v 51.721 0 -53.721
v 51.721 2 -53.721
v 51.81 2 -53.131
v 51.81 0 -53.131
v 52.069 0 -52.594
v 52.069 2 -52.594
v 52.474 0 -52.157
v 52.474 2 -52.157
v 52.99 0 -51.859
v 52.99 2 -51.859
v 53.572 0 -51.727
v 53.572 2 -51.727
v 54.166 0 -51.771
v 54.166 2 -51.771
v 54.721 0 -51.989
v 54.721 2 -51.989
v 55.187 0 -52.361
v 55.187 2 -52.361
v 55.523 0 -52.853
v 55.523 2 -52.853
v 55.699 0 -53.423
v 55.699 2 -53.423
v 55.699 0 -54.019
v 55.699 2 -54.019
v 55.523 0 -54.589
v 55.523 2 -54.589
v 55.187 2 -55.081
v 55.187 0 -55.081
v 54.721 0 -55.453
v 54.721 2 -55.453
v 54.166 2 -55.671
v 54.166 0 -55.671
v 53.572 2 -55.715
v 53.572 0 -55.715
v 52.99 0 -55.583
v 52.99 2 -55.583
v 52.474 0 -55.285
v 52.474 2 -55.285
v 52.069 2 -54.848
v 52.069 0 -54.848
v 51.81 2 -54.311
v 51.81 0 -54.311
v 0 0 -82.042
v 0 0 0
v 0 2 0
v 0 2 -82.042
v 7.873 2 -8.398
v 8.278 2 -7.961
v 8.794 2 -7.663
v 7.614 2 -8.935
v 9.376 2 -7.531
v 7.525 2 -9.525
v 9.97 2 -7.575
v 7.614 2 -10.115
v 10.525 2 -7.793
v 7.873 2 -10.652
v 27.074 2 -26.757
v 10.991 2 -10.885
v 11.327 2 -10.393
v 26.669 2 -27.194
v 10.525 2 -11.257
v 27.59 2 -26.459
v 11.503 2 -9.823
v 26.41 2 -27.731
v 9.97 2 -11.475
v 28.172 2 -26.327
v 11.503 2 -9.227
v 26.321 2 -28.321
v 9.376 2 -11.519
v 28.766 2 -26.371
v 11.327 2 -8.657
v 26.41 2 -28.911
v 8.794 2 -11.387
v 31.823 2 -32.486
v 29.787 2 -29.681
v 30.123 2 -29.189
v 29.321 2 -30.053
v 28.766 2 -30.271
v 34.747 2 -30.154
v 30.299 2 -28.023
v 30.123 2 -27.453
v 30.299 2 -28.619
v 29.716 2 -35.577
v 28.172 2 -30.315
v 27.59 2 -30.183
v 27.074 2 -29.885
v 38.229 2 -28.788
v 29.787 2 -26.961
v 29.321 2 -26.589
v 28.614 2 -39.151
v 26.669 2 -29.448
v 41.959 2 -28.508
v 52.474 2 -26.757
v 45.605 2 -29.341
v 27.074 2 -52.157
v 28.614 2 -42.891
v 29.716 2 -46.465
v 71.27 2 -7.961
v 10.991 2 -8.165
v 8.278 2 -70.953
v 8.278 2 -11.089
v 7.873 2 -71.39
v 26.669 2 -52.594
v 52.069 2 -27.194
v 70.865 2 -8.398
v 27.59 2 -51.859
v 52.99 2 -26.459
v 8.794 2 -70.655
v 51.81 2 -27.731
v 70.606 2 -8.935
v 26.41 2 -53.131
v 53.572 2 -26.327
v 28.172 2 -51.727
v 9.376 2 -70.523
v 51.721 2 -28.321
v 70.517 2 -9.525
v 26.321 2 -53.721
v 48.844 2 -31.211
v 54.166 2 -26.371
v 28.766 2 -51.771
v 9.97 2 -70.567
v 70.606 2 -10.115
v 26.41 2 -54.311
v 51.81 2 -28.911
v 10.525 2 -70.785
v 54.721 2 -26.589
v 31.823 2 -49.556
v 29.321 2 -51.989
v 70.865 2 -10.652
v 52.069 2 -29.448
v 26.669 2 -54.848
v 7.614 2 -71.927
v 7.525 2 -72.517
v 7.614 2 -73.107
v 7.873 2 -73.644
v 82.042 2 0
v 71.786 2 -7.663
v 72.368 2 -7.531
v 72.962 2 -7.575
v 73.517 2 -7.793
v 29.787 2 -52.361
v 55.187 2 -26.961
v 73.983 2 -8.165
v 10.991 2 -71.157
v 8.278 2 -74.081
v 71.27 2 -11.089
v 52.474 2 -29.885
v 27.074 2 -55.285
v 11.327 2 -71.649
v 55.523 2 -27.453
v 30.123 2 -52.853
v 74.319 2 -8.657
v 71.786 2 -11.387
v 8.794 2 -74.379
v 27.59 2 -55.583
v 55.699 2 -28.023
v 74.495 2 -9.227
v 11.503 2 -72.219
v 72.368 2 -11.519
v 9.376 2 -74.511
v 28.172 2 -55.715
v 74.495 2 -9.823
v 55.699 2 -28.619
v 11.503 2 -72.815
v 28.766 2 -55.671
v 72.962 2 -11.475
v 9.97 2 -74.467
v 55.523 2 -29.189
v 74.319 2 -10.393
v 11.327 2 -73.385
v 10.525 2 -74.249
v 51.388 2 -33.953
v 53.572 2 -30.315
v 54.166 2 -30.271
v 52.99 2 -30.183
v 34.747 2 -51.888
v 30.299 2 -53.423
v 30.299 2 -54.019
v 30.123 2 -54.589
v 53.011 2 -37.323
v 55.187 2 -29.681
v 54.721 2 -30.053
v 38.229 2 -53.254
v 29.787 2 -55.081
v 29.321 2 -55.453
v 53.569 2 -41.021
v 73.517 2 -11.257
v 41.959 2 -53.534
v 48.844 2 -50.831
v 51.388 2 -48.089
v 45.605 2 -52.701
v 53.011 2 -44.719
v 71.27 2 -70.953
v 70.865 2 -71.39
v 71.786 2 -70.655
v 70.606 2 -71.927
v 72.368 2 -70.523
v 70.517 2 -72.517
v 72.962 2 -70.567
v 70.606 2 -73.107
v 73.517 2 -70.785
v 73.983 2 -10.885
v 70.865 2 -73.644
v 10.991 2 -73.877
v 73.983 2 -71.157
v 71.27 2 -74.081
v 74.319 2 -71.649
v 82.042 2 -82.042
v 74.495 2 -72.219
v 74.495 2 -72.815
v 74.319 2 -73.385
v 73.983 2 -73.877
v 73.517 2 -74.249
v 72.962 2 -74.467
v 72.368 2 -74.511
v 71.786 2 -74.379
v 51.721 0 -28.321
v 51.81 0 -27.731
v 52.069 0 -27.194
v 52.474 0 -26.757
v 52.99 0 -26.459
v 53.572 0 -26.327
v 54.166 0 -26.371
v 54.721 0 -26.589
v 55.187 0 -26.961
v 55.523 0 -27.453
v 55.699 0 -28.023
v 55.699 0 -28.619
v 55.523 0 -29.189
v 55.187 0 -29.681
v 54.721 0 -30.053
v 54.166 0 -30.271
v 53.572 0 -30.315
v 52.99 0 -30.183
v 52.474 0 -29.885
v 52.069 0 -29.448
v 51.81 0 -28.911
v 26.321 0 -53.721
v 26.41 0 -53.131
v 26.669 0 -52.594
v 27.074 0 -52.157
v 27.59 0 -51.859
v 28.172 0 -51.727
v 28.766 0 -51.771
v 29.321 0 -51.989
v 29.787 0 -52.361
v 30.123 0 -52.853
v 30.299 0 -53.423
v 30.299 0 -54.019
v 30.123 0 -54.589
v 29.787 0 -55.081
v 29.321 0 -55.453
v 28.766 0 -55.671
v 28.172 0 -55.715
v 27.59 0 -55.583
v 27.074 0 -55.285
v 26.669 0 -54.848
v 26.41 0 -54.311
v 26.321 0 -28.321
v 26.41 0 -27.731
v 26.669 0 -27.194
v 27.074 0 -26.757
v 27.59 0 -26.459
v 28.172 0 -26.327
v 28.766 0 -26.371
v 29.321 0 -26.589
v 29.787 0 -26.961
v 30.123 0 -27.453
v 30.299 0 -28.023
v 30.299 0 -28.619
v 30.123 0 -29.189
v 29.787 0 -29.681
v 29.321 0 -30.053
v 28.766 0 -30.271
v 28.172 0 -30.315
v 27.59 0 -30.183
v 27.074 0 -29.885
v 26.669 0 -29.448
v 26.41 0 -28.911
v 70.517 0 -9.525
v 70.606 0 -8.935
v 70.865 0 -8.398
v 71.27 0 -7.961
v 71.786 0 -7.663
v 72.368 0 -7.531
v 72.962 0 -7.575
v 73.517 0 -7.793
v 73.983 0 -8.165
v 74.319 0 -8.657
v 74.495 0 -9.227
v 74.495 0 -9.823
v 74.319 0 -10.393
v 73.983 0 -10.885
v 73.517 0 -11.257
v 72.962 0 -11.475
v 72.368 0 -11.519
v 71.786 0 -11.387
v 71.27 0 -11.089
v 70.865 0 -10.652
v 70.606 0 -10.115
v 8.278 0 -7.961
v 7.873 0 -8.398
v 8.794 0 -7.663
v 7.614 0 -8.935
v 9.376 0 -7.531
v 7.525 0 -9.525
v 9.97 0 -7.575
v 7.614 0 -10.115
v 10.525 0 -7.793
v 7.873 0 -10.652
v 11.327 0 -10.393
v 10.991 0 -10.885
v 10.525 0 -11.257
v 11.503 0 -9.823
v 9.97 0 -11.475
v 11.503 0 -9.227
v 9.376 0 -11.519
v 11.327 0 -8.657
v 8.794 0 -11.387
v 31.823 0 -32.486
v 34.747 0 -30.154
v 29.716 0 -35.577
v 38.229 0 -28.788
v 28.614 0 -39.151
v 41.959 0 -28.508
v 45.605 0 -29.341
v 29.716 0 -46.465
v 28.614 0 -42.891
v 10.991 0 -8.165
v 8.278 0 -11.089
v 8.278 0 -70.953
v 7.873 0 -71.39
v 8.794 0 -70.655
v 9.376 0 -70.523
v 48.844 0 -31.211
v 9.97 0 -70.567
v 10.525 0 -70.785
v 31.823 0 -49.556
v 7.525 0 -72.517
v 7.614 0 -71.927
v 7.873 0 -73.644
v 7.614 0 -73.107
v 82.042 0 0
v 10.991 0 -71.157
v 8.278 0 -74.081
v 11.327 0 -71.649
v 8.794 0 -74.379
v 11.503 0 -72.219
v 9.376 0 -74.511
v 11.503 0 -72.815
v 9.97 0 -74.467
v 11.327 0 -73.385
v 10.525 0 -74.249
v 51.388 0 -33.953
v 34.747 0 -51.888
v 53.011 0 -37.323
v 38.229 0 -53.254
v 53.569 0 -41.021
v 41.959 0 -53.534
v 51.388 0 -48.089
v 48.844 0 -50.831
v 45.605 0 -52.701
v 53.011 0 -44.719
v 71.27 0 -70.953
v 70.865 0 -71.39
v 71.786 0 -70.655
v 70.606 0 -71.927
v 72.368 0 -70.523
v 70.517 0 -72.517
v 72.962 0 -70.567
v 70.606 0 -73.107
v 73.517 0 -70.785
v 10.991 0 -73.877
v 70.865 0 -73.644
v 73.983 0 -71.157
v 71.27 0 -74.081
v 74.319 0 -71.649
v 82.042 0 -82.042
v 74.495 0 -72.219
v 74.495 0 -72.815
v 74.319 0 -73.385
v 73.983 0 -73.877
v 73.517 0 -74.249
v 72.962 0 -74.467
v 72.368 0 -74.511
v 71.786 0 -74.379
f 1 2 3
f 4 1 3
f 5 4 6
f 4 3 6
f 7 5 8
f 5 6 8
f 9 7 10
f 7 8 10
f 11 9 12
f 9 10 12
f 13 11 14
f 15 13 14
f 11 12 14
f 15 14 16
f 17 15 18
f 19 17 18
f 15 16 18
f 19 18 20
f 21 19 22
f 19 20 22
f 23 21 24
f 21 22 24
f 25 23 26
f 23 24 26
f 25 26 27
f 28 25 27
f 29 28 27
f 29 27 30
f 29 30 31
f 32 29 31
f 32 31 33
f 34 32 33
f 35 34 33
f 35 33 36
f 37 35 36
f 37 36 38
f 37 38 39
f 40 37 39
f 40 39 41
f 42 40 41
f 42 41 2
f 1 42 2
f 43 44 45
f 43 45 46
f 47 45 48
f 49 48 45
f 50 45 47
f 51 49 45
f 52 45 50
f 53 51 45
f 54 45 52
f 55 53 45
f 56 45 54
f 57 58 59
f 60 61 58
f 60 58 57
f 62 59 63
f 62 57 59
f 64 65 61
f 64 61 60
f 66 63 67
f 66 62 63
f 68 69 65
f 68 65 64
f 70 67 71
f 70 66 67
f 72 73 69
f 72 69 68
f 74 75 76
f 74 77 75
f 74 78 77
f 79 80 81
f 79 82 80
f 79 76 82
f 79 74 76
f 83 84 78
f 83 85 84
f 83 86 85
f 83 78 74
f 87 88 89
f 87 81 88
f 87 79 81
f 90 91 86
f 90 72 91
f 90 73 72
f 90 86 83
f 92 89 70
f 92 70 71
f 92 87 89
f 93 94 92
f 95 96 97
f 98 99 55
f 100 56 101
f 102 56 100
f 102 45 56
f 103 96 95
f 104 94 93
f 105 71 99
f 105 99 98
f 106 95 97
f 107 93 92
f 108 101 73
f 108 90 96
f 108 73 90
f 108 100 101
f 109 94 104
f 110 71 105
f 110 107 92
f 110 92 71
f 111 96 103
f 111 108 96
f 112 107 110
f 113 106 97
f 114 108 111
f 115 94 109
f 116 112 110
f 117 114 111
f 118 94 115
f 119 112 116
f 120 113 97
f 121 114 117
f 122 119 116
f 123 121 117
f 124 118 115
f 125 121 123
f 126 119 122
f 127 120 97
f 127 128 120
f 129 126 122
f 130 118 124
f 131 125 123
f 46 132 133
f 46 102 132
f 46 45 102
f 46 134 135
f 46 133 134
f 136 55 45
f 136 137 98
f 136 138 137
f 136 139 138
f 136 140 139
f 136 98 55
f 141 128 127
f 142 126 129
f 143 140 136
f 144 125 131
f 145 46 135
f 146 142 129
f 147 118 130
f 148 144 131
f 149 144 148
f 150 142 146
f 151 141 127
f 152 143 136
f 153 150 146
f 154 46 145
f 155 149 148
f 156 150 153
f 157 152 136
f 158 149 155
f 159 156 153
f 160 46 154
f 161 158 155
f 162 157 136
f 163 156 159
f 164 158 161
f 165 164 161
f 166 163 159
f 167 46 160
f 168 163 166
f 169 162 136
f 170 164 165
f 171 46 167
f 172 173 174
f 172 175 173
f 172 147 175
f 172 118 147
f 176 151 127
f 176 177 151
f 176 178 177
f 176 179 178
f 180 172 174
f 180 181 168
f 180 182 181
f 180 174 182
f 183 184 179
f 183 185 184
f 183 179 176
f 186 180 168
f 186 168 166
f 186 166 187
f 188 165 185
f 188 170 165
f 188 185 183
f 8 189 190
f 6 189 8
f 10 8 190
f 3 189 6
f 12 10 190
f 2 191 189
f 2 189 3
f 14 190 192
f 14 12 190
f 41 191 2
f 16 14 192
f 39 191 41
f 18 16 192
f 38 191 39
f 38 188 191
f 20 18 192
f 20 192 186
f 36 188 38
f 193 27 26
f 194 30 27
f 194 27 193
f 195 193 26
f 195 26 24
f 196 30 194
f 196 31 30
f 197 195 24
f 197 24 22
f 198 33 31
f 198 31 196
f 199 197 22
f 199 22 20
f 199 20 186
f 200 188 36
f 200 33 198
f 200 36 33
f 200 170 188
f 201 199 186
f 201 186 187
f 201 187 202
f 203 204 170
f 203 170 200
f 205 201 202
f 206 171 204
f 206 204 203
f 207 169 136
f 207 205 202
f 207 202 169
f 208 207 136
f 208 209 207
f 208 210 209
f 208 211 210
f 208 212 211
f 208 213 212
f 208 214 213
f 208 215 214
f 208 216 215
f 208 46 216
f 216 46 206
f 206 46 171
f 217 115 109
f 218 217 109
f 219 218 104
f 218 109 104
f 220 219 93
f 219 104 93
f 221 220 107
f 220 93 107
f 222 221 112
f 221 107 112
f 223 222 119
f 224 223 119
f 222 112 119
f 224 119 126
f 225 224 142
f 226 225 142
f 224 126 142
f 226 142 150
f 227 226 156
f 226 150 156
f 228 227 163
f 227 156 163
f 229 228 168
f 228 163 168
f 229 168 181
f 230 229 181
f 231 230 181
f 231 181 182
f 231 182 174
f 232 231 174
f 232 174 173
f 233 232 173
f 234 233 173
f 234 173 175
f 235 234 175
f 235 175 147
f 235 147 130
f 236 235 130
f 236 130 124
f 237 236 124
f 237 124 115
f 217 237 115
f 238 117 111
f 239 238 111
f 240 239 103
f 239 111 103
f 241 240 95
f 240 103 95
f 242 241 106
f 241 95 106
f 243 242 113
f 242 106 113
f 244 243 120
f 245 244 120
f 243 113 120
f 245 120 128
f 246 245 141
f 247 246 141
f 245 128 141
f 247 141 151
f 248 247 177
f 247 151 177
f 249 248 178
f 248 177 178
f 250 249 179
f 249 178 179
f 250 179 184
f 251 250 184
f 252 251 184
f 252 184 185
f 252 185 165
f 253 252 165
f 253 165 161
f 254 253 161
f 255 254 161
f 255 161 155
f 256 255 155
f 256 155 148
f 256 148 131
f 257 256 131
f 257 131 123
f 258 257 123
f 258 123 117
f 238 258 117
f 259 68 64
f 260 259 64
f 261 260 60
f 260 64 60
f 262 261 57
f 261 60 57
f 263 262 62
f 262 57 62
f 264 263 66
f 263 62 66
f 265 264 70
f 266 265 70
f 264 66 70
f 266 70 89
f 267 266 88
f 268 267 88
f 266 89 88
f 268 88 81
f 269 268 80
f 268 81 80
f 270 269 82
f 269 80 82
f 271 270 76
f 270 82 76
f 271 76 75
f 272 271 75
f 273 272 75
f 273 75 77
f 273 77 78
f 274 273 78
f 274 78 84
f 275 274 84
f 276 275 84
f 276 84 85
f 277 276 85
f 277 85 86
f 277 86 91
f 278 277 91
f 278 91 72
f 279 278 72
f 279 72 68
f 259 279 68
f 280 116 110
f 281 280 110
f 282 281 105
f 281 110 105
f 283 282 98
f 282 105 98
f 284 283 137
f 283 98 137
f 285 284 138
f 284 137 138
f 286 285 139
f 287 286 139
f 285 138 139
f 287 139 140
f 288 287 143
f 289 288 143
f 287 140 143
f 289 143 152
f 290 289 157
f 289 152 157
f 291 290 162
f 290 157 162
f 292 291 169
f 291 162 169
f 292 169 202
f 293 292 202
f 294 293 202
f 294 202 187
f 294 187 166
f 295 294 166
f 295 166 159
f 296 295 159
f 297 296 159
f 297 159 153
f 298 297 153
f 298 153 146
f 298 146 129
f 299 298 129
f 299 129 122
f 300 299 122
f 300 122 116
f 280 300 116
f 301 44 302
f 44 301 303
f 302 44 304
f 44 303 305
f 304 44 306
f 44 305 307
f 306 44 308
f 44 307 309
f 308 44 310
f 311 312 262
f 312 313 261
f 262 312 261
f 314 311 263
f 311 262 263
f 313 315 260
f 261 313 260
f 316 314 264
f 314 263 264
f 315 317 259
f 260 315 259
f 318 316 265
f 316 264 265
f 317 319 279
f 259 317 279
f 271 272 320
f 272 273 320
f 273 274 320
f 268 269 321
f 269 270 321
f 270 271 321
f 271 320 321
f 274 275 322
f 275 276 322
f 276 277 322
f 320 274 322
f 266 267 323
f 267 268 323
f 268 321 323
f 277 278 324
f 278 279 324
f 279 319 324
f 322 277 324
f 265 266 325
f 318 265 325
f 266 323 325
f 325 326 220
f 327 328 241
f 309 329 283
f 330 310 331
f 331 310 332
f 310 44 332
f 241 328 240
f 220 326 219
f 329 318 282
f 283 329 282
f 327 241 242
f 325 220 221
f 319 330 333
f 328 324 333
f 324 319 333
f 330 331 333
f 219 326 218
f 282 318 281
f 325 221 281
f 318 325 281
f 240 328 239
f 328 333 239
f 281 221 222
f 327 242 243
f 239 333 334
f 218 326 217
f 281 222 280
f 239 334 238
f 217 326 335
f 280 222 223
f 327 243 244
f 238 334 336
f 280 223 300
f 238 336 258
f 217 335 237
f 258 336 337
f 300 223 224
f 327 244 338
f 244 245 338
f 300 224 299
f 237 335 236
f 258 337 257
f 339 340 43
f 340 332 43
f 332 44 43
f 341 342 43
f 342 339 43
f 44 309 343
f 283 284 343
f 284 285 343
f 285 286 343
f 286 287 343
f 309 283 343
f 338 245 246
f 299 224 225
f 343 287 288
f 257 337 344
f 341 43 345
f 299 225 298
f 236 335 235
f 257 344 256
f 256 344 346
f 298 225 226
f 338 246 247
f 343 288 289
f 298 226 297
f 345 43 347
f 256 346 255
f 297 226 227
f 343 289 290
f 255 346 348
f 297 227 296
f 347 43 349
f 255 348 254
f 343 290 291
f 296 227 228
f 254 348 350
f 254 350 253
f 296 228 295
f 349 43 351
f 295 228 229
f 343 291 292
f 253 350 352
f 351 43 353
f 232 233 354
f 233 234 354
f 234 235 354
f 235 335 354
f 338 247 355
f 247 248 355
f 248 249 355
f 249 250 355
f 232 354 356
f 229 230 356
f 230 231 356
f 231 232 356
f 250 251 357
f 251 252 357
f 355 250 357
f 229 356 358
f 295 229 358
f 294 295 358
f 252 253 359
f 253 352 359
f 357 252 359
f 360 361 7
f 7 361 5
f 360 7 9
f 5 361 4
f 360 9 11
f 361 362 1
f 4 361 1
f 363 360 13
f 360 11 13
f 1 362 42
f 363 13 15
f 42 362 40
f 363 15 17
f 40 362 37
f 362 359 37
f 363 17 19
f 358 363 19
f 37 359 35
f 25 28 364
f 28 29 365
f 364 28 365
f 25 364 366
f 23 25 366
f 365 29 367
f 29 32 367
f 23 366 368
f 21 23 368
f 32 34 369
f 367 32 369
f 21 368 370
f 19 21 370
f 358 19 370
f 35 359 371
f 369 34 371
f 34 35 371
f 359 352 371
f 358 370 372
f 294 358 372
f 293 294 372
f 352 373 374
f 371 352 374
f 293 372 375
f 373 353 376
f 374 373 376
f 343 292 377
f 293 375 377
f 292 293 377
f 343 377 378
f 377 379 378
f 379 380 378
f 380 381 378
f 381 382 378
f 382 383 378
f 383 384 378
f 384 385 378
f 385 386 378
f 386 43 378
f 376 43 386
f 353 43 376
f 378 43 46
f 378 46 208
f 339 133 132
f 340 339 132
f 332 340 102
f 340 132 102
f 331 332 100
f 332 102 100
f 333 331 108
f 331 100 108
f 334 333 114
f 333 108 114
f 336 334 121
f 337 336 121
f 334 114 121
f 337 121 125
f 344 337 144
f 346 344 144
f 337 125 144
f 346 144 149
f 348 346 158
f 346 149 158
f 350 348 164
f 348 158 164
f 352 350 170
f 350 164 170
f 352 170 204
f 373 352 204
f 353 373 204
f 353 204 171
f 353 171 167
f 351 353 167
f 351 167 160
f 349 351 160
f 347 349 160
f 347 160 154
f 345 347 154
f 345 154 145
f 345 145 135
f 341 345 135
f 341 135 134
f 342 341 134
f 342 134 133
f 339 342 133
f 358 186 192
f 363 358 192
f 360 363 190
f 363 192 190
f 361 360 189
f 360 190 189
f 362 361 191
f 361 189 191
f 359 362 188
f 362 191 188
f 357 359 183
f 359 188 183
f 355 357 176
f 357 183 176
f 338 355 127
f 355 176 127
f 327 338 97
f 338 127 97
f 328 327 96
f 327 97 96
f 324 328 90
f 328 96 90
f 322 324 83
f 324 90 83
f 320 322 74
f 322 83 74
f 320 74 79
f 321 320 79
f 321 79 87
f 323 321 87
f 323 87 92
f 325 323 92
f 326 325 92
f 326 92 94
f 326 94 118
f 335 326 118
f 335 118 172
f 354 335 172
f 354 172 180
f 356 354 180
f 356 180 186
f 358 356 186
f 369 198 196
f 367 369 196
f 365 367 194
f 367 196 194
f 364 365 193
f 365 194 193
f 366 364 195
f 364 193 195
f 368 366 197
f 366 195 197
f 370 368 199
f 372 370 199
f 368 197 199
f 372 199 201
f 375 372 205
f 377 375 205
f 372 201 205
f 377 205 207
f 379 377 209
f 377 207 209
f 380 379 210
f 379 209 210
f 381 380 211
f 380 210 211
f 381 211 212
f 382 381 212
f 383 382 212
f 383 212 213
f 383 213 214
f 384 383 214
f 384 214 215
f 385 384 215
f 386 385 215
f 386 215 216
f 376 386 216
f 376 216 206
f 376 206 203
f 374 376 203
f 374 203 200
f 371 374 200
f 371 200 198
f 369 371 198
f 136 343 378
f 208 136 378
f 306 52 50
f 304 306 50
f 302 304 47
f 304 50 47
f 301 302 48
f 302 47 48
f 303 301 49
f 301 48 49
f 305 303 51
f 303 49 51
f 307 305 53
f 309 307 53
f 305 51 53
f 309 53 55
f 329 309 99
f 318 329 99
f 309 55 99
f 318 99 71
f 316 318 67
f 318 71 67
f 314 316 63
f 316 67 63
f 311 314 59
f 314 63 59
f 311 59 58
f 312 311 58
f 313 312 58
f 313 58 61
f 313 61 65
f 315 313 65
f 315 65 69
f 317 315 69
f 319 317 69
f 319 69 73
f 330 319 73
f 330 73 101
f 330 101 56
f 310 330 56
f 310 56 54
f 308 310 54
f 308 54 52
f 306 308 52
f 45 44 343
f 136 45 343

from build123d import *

# Parameters (mm, degrees)
SKETCH1_W           = 82.042
SKETCH1_H           = 82.042
BOSS_EXTRUDE1_DEPTH = 2
SKETCH2_R           = 2
CUT_EXTRUDE1_DEPTH  = 3
SKETCH3_R           = 12.5476
CUT_EXTRUDE2_DEPTH  = 3


with BuildPart() as part:
    # Sketch1 → Boss-Extrude1 (new body)
    with BuildSketch(Plane(origin=(0, 0, 0), x_dir=(1, 0, 0), z_dir=(0, 1, 0))):
        with Locations((41.021, 41.021)):
            Rectangle(SKETCH1_W, SKETCH1_H)
    extrude(amount=BOSS_EXTRUDE1_DEPTH)

    # Sketch2 → Cut-Extrude1 (cut, through all)
    with BuildSketch(Plane(origin=(0, 2, 0), x_dir=(-1, 0, 0), z_dir=(0, 1, 0))):
        with Locations((-28.321, -53.721)):
            Circle(SKETCH2_R)
        with Locations((-53.721, -53.721)):
            Circle(SKETCH2_R)
        with Locations((-53.721, -28.321)):
            Circle(SKETCH2_R)
        with Locations((-28.321, -28.321)):
            Circle(SKETCH2_R)
        with Locations((-9.525, -9.525)):
            Circle(SKETCH2_R)
        with Locations((-9.525, -72.517)):
            Circle(SKETCH2_R)
        with Locations((-72.517, -9.525)):
            Circle(SKETCH2_R)
        with Locations((-72.517, -72.517)):
            Circle(SKETCH2_R)
    extrude(amount=-CUT_EXTRUDE1_DEPTH, mode=Mode.SUBTRACT)

    # Sketch3 → Cut-Extrude2 (cut, through all)
    with BuildSketch(Plane(origin=(0, 2, 0), x_dir=(1, 0, 0), z_dir=(0, 1, 0))):
        with Locations((41.021, 41.021)):
            Circle(SKETCH3_R)
    extrude(amount=-CUT_EXTRUDE2_DEPTH, mode=Mode.SUBTRACT)


solid = part.part
